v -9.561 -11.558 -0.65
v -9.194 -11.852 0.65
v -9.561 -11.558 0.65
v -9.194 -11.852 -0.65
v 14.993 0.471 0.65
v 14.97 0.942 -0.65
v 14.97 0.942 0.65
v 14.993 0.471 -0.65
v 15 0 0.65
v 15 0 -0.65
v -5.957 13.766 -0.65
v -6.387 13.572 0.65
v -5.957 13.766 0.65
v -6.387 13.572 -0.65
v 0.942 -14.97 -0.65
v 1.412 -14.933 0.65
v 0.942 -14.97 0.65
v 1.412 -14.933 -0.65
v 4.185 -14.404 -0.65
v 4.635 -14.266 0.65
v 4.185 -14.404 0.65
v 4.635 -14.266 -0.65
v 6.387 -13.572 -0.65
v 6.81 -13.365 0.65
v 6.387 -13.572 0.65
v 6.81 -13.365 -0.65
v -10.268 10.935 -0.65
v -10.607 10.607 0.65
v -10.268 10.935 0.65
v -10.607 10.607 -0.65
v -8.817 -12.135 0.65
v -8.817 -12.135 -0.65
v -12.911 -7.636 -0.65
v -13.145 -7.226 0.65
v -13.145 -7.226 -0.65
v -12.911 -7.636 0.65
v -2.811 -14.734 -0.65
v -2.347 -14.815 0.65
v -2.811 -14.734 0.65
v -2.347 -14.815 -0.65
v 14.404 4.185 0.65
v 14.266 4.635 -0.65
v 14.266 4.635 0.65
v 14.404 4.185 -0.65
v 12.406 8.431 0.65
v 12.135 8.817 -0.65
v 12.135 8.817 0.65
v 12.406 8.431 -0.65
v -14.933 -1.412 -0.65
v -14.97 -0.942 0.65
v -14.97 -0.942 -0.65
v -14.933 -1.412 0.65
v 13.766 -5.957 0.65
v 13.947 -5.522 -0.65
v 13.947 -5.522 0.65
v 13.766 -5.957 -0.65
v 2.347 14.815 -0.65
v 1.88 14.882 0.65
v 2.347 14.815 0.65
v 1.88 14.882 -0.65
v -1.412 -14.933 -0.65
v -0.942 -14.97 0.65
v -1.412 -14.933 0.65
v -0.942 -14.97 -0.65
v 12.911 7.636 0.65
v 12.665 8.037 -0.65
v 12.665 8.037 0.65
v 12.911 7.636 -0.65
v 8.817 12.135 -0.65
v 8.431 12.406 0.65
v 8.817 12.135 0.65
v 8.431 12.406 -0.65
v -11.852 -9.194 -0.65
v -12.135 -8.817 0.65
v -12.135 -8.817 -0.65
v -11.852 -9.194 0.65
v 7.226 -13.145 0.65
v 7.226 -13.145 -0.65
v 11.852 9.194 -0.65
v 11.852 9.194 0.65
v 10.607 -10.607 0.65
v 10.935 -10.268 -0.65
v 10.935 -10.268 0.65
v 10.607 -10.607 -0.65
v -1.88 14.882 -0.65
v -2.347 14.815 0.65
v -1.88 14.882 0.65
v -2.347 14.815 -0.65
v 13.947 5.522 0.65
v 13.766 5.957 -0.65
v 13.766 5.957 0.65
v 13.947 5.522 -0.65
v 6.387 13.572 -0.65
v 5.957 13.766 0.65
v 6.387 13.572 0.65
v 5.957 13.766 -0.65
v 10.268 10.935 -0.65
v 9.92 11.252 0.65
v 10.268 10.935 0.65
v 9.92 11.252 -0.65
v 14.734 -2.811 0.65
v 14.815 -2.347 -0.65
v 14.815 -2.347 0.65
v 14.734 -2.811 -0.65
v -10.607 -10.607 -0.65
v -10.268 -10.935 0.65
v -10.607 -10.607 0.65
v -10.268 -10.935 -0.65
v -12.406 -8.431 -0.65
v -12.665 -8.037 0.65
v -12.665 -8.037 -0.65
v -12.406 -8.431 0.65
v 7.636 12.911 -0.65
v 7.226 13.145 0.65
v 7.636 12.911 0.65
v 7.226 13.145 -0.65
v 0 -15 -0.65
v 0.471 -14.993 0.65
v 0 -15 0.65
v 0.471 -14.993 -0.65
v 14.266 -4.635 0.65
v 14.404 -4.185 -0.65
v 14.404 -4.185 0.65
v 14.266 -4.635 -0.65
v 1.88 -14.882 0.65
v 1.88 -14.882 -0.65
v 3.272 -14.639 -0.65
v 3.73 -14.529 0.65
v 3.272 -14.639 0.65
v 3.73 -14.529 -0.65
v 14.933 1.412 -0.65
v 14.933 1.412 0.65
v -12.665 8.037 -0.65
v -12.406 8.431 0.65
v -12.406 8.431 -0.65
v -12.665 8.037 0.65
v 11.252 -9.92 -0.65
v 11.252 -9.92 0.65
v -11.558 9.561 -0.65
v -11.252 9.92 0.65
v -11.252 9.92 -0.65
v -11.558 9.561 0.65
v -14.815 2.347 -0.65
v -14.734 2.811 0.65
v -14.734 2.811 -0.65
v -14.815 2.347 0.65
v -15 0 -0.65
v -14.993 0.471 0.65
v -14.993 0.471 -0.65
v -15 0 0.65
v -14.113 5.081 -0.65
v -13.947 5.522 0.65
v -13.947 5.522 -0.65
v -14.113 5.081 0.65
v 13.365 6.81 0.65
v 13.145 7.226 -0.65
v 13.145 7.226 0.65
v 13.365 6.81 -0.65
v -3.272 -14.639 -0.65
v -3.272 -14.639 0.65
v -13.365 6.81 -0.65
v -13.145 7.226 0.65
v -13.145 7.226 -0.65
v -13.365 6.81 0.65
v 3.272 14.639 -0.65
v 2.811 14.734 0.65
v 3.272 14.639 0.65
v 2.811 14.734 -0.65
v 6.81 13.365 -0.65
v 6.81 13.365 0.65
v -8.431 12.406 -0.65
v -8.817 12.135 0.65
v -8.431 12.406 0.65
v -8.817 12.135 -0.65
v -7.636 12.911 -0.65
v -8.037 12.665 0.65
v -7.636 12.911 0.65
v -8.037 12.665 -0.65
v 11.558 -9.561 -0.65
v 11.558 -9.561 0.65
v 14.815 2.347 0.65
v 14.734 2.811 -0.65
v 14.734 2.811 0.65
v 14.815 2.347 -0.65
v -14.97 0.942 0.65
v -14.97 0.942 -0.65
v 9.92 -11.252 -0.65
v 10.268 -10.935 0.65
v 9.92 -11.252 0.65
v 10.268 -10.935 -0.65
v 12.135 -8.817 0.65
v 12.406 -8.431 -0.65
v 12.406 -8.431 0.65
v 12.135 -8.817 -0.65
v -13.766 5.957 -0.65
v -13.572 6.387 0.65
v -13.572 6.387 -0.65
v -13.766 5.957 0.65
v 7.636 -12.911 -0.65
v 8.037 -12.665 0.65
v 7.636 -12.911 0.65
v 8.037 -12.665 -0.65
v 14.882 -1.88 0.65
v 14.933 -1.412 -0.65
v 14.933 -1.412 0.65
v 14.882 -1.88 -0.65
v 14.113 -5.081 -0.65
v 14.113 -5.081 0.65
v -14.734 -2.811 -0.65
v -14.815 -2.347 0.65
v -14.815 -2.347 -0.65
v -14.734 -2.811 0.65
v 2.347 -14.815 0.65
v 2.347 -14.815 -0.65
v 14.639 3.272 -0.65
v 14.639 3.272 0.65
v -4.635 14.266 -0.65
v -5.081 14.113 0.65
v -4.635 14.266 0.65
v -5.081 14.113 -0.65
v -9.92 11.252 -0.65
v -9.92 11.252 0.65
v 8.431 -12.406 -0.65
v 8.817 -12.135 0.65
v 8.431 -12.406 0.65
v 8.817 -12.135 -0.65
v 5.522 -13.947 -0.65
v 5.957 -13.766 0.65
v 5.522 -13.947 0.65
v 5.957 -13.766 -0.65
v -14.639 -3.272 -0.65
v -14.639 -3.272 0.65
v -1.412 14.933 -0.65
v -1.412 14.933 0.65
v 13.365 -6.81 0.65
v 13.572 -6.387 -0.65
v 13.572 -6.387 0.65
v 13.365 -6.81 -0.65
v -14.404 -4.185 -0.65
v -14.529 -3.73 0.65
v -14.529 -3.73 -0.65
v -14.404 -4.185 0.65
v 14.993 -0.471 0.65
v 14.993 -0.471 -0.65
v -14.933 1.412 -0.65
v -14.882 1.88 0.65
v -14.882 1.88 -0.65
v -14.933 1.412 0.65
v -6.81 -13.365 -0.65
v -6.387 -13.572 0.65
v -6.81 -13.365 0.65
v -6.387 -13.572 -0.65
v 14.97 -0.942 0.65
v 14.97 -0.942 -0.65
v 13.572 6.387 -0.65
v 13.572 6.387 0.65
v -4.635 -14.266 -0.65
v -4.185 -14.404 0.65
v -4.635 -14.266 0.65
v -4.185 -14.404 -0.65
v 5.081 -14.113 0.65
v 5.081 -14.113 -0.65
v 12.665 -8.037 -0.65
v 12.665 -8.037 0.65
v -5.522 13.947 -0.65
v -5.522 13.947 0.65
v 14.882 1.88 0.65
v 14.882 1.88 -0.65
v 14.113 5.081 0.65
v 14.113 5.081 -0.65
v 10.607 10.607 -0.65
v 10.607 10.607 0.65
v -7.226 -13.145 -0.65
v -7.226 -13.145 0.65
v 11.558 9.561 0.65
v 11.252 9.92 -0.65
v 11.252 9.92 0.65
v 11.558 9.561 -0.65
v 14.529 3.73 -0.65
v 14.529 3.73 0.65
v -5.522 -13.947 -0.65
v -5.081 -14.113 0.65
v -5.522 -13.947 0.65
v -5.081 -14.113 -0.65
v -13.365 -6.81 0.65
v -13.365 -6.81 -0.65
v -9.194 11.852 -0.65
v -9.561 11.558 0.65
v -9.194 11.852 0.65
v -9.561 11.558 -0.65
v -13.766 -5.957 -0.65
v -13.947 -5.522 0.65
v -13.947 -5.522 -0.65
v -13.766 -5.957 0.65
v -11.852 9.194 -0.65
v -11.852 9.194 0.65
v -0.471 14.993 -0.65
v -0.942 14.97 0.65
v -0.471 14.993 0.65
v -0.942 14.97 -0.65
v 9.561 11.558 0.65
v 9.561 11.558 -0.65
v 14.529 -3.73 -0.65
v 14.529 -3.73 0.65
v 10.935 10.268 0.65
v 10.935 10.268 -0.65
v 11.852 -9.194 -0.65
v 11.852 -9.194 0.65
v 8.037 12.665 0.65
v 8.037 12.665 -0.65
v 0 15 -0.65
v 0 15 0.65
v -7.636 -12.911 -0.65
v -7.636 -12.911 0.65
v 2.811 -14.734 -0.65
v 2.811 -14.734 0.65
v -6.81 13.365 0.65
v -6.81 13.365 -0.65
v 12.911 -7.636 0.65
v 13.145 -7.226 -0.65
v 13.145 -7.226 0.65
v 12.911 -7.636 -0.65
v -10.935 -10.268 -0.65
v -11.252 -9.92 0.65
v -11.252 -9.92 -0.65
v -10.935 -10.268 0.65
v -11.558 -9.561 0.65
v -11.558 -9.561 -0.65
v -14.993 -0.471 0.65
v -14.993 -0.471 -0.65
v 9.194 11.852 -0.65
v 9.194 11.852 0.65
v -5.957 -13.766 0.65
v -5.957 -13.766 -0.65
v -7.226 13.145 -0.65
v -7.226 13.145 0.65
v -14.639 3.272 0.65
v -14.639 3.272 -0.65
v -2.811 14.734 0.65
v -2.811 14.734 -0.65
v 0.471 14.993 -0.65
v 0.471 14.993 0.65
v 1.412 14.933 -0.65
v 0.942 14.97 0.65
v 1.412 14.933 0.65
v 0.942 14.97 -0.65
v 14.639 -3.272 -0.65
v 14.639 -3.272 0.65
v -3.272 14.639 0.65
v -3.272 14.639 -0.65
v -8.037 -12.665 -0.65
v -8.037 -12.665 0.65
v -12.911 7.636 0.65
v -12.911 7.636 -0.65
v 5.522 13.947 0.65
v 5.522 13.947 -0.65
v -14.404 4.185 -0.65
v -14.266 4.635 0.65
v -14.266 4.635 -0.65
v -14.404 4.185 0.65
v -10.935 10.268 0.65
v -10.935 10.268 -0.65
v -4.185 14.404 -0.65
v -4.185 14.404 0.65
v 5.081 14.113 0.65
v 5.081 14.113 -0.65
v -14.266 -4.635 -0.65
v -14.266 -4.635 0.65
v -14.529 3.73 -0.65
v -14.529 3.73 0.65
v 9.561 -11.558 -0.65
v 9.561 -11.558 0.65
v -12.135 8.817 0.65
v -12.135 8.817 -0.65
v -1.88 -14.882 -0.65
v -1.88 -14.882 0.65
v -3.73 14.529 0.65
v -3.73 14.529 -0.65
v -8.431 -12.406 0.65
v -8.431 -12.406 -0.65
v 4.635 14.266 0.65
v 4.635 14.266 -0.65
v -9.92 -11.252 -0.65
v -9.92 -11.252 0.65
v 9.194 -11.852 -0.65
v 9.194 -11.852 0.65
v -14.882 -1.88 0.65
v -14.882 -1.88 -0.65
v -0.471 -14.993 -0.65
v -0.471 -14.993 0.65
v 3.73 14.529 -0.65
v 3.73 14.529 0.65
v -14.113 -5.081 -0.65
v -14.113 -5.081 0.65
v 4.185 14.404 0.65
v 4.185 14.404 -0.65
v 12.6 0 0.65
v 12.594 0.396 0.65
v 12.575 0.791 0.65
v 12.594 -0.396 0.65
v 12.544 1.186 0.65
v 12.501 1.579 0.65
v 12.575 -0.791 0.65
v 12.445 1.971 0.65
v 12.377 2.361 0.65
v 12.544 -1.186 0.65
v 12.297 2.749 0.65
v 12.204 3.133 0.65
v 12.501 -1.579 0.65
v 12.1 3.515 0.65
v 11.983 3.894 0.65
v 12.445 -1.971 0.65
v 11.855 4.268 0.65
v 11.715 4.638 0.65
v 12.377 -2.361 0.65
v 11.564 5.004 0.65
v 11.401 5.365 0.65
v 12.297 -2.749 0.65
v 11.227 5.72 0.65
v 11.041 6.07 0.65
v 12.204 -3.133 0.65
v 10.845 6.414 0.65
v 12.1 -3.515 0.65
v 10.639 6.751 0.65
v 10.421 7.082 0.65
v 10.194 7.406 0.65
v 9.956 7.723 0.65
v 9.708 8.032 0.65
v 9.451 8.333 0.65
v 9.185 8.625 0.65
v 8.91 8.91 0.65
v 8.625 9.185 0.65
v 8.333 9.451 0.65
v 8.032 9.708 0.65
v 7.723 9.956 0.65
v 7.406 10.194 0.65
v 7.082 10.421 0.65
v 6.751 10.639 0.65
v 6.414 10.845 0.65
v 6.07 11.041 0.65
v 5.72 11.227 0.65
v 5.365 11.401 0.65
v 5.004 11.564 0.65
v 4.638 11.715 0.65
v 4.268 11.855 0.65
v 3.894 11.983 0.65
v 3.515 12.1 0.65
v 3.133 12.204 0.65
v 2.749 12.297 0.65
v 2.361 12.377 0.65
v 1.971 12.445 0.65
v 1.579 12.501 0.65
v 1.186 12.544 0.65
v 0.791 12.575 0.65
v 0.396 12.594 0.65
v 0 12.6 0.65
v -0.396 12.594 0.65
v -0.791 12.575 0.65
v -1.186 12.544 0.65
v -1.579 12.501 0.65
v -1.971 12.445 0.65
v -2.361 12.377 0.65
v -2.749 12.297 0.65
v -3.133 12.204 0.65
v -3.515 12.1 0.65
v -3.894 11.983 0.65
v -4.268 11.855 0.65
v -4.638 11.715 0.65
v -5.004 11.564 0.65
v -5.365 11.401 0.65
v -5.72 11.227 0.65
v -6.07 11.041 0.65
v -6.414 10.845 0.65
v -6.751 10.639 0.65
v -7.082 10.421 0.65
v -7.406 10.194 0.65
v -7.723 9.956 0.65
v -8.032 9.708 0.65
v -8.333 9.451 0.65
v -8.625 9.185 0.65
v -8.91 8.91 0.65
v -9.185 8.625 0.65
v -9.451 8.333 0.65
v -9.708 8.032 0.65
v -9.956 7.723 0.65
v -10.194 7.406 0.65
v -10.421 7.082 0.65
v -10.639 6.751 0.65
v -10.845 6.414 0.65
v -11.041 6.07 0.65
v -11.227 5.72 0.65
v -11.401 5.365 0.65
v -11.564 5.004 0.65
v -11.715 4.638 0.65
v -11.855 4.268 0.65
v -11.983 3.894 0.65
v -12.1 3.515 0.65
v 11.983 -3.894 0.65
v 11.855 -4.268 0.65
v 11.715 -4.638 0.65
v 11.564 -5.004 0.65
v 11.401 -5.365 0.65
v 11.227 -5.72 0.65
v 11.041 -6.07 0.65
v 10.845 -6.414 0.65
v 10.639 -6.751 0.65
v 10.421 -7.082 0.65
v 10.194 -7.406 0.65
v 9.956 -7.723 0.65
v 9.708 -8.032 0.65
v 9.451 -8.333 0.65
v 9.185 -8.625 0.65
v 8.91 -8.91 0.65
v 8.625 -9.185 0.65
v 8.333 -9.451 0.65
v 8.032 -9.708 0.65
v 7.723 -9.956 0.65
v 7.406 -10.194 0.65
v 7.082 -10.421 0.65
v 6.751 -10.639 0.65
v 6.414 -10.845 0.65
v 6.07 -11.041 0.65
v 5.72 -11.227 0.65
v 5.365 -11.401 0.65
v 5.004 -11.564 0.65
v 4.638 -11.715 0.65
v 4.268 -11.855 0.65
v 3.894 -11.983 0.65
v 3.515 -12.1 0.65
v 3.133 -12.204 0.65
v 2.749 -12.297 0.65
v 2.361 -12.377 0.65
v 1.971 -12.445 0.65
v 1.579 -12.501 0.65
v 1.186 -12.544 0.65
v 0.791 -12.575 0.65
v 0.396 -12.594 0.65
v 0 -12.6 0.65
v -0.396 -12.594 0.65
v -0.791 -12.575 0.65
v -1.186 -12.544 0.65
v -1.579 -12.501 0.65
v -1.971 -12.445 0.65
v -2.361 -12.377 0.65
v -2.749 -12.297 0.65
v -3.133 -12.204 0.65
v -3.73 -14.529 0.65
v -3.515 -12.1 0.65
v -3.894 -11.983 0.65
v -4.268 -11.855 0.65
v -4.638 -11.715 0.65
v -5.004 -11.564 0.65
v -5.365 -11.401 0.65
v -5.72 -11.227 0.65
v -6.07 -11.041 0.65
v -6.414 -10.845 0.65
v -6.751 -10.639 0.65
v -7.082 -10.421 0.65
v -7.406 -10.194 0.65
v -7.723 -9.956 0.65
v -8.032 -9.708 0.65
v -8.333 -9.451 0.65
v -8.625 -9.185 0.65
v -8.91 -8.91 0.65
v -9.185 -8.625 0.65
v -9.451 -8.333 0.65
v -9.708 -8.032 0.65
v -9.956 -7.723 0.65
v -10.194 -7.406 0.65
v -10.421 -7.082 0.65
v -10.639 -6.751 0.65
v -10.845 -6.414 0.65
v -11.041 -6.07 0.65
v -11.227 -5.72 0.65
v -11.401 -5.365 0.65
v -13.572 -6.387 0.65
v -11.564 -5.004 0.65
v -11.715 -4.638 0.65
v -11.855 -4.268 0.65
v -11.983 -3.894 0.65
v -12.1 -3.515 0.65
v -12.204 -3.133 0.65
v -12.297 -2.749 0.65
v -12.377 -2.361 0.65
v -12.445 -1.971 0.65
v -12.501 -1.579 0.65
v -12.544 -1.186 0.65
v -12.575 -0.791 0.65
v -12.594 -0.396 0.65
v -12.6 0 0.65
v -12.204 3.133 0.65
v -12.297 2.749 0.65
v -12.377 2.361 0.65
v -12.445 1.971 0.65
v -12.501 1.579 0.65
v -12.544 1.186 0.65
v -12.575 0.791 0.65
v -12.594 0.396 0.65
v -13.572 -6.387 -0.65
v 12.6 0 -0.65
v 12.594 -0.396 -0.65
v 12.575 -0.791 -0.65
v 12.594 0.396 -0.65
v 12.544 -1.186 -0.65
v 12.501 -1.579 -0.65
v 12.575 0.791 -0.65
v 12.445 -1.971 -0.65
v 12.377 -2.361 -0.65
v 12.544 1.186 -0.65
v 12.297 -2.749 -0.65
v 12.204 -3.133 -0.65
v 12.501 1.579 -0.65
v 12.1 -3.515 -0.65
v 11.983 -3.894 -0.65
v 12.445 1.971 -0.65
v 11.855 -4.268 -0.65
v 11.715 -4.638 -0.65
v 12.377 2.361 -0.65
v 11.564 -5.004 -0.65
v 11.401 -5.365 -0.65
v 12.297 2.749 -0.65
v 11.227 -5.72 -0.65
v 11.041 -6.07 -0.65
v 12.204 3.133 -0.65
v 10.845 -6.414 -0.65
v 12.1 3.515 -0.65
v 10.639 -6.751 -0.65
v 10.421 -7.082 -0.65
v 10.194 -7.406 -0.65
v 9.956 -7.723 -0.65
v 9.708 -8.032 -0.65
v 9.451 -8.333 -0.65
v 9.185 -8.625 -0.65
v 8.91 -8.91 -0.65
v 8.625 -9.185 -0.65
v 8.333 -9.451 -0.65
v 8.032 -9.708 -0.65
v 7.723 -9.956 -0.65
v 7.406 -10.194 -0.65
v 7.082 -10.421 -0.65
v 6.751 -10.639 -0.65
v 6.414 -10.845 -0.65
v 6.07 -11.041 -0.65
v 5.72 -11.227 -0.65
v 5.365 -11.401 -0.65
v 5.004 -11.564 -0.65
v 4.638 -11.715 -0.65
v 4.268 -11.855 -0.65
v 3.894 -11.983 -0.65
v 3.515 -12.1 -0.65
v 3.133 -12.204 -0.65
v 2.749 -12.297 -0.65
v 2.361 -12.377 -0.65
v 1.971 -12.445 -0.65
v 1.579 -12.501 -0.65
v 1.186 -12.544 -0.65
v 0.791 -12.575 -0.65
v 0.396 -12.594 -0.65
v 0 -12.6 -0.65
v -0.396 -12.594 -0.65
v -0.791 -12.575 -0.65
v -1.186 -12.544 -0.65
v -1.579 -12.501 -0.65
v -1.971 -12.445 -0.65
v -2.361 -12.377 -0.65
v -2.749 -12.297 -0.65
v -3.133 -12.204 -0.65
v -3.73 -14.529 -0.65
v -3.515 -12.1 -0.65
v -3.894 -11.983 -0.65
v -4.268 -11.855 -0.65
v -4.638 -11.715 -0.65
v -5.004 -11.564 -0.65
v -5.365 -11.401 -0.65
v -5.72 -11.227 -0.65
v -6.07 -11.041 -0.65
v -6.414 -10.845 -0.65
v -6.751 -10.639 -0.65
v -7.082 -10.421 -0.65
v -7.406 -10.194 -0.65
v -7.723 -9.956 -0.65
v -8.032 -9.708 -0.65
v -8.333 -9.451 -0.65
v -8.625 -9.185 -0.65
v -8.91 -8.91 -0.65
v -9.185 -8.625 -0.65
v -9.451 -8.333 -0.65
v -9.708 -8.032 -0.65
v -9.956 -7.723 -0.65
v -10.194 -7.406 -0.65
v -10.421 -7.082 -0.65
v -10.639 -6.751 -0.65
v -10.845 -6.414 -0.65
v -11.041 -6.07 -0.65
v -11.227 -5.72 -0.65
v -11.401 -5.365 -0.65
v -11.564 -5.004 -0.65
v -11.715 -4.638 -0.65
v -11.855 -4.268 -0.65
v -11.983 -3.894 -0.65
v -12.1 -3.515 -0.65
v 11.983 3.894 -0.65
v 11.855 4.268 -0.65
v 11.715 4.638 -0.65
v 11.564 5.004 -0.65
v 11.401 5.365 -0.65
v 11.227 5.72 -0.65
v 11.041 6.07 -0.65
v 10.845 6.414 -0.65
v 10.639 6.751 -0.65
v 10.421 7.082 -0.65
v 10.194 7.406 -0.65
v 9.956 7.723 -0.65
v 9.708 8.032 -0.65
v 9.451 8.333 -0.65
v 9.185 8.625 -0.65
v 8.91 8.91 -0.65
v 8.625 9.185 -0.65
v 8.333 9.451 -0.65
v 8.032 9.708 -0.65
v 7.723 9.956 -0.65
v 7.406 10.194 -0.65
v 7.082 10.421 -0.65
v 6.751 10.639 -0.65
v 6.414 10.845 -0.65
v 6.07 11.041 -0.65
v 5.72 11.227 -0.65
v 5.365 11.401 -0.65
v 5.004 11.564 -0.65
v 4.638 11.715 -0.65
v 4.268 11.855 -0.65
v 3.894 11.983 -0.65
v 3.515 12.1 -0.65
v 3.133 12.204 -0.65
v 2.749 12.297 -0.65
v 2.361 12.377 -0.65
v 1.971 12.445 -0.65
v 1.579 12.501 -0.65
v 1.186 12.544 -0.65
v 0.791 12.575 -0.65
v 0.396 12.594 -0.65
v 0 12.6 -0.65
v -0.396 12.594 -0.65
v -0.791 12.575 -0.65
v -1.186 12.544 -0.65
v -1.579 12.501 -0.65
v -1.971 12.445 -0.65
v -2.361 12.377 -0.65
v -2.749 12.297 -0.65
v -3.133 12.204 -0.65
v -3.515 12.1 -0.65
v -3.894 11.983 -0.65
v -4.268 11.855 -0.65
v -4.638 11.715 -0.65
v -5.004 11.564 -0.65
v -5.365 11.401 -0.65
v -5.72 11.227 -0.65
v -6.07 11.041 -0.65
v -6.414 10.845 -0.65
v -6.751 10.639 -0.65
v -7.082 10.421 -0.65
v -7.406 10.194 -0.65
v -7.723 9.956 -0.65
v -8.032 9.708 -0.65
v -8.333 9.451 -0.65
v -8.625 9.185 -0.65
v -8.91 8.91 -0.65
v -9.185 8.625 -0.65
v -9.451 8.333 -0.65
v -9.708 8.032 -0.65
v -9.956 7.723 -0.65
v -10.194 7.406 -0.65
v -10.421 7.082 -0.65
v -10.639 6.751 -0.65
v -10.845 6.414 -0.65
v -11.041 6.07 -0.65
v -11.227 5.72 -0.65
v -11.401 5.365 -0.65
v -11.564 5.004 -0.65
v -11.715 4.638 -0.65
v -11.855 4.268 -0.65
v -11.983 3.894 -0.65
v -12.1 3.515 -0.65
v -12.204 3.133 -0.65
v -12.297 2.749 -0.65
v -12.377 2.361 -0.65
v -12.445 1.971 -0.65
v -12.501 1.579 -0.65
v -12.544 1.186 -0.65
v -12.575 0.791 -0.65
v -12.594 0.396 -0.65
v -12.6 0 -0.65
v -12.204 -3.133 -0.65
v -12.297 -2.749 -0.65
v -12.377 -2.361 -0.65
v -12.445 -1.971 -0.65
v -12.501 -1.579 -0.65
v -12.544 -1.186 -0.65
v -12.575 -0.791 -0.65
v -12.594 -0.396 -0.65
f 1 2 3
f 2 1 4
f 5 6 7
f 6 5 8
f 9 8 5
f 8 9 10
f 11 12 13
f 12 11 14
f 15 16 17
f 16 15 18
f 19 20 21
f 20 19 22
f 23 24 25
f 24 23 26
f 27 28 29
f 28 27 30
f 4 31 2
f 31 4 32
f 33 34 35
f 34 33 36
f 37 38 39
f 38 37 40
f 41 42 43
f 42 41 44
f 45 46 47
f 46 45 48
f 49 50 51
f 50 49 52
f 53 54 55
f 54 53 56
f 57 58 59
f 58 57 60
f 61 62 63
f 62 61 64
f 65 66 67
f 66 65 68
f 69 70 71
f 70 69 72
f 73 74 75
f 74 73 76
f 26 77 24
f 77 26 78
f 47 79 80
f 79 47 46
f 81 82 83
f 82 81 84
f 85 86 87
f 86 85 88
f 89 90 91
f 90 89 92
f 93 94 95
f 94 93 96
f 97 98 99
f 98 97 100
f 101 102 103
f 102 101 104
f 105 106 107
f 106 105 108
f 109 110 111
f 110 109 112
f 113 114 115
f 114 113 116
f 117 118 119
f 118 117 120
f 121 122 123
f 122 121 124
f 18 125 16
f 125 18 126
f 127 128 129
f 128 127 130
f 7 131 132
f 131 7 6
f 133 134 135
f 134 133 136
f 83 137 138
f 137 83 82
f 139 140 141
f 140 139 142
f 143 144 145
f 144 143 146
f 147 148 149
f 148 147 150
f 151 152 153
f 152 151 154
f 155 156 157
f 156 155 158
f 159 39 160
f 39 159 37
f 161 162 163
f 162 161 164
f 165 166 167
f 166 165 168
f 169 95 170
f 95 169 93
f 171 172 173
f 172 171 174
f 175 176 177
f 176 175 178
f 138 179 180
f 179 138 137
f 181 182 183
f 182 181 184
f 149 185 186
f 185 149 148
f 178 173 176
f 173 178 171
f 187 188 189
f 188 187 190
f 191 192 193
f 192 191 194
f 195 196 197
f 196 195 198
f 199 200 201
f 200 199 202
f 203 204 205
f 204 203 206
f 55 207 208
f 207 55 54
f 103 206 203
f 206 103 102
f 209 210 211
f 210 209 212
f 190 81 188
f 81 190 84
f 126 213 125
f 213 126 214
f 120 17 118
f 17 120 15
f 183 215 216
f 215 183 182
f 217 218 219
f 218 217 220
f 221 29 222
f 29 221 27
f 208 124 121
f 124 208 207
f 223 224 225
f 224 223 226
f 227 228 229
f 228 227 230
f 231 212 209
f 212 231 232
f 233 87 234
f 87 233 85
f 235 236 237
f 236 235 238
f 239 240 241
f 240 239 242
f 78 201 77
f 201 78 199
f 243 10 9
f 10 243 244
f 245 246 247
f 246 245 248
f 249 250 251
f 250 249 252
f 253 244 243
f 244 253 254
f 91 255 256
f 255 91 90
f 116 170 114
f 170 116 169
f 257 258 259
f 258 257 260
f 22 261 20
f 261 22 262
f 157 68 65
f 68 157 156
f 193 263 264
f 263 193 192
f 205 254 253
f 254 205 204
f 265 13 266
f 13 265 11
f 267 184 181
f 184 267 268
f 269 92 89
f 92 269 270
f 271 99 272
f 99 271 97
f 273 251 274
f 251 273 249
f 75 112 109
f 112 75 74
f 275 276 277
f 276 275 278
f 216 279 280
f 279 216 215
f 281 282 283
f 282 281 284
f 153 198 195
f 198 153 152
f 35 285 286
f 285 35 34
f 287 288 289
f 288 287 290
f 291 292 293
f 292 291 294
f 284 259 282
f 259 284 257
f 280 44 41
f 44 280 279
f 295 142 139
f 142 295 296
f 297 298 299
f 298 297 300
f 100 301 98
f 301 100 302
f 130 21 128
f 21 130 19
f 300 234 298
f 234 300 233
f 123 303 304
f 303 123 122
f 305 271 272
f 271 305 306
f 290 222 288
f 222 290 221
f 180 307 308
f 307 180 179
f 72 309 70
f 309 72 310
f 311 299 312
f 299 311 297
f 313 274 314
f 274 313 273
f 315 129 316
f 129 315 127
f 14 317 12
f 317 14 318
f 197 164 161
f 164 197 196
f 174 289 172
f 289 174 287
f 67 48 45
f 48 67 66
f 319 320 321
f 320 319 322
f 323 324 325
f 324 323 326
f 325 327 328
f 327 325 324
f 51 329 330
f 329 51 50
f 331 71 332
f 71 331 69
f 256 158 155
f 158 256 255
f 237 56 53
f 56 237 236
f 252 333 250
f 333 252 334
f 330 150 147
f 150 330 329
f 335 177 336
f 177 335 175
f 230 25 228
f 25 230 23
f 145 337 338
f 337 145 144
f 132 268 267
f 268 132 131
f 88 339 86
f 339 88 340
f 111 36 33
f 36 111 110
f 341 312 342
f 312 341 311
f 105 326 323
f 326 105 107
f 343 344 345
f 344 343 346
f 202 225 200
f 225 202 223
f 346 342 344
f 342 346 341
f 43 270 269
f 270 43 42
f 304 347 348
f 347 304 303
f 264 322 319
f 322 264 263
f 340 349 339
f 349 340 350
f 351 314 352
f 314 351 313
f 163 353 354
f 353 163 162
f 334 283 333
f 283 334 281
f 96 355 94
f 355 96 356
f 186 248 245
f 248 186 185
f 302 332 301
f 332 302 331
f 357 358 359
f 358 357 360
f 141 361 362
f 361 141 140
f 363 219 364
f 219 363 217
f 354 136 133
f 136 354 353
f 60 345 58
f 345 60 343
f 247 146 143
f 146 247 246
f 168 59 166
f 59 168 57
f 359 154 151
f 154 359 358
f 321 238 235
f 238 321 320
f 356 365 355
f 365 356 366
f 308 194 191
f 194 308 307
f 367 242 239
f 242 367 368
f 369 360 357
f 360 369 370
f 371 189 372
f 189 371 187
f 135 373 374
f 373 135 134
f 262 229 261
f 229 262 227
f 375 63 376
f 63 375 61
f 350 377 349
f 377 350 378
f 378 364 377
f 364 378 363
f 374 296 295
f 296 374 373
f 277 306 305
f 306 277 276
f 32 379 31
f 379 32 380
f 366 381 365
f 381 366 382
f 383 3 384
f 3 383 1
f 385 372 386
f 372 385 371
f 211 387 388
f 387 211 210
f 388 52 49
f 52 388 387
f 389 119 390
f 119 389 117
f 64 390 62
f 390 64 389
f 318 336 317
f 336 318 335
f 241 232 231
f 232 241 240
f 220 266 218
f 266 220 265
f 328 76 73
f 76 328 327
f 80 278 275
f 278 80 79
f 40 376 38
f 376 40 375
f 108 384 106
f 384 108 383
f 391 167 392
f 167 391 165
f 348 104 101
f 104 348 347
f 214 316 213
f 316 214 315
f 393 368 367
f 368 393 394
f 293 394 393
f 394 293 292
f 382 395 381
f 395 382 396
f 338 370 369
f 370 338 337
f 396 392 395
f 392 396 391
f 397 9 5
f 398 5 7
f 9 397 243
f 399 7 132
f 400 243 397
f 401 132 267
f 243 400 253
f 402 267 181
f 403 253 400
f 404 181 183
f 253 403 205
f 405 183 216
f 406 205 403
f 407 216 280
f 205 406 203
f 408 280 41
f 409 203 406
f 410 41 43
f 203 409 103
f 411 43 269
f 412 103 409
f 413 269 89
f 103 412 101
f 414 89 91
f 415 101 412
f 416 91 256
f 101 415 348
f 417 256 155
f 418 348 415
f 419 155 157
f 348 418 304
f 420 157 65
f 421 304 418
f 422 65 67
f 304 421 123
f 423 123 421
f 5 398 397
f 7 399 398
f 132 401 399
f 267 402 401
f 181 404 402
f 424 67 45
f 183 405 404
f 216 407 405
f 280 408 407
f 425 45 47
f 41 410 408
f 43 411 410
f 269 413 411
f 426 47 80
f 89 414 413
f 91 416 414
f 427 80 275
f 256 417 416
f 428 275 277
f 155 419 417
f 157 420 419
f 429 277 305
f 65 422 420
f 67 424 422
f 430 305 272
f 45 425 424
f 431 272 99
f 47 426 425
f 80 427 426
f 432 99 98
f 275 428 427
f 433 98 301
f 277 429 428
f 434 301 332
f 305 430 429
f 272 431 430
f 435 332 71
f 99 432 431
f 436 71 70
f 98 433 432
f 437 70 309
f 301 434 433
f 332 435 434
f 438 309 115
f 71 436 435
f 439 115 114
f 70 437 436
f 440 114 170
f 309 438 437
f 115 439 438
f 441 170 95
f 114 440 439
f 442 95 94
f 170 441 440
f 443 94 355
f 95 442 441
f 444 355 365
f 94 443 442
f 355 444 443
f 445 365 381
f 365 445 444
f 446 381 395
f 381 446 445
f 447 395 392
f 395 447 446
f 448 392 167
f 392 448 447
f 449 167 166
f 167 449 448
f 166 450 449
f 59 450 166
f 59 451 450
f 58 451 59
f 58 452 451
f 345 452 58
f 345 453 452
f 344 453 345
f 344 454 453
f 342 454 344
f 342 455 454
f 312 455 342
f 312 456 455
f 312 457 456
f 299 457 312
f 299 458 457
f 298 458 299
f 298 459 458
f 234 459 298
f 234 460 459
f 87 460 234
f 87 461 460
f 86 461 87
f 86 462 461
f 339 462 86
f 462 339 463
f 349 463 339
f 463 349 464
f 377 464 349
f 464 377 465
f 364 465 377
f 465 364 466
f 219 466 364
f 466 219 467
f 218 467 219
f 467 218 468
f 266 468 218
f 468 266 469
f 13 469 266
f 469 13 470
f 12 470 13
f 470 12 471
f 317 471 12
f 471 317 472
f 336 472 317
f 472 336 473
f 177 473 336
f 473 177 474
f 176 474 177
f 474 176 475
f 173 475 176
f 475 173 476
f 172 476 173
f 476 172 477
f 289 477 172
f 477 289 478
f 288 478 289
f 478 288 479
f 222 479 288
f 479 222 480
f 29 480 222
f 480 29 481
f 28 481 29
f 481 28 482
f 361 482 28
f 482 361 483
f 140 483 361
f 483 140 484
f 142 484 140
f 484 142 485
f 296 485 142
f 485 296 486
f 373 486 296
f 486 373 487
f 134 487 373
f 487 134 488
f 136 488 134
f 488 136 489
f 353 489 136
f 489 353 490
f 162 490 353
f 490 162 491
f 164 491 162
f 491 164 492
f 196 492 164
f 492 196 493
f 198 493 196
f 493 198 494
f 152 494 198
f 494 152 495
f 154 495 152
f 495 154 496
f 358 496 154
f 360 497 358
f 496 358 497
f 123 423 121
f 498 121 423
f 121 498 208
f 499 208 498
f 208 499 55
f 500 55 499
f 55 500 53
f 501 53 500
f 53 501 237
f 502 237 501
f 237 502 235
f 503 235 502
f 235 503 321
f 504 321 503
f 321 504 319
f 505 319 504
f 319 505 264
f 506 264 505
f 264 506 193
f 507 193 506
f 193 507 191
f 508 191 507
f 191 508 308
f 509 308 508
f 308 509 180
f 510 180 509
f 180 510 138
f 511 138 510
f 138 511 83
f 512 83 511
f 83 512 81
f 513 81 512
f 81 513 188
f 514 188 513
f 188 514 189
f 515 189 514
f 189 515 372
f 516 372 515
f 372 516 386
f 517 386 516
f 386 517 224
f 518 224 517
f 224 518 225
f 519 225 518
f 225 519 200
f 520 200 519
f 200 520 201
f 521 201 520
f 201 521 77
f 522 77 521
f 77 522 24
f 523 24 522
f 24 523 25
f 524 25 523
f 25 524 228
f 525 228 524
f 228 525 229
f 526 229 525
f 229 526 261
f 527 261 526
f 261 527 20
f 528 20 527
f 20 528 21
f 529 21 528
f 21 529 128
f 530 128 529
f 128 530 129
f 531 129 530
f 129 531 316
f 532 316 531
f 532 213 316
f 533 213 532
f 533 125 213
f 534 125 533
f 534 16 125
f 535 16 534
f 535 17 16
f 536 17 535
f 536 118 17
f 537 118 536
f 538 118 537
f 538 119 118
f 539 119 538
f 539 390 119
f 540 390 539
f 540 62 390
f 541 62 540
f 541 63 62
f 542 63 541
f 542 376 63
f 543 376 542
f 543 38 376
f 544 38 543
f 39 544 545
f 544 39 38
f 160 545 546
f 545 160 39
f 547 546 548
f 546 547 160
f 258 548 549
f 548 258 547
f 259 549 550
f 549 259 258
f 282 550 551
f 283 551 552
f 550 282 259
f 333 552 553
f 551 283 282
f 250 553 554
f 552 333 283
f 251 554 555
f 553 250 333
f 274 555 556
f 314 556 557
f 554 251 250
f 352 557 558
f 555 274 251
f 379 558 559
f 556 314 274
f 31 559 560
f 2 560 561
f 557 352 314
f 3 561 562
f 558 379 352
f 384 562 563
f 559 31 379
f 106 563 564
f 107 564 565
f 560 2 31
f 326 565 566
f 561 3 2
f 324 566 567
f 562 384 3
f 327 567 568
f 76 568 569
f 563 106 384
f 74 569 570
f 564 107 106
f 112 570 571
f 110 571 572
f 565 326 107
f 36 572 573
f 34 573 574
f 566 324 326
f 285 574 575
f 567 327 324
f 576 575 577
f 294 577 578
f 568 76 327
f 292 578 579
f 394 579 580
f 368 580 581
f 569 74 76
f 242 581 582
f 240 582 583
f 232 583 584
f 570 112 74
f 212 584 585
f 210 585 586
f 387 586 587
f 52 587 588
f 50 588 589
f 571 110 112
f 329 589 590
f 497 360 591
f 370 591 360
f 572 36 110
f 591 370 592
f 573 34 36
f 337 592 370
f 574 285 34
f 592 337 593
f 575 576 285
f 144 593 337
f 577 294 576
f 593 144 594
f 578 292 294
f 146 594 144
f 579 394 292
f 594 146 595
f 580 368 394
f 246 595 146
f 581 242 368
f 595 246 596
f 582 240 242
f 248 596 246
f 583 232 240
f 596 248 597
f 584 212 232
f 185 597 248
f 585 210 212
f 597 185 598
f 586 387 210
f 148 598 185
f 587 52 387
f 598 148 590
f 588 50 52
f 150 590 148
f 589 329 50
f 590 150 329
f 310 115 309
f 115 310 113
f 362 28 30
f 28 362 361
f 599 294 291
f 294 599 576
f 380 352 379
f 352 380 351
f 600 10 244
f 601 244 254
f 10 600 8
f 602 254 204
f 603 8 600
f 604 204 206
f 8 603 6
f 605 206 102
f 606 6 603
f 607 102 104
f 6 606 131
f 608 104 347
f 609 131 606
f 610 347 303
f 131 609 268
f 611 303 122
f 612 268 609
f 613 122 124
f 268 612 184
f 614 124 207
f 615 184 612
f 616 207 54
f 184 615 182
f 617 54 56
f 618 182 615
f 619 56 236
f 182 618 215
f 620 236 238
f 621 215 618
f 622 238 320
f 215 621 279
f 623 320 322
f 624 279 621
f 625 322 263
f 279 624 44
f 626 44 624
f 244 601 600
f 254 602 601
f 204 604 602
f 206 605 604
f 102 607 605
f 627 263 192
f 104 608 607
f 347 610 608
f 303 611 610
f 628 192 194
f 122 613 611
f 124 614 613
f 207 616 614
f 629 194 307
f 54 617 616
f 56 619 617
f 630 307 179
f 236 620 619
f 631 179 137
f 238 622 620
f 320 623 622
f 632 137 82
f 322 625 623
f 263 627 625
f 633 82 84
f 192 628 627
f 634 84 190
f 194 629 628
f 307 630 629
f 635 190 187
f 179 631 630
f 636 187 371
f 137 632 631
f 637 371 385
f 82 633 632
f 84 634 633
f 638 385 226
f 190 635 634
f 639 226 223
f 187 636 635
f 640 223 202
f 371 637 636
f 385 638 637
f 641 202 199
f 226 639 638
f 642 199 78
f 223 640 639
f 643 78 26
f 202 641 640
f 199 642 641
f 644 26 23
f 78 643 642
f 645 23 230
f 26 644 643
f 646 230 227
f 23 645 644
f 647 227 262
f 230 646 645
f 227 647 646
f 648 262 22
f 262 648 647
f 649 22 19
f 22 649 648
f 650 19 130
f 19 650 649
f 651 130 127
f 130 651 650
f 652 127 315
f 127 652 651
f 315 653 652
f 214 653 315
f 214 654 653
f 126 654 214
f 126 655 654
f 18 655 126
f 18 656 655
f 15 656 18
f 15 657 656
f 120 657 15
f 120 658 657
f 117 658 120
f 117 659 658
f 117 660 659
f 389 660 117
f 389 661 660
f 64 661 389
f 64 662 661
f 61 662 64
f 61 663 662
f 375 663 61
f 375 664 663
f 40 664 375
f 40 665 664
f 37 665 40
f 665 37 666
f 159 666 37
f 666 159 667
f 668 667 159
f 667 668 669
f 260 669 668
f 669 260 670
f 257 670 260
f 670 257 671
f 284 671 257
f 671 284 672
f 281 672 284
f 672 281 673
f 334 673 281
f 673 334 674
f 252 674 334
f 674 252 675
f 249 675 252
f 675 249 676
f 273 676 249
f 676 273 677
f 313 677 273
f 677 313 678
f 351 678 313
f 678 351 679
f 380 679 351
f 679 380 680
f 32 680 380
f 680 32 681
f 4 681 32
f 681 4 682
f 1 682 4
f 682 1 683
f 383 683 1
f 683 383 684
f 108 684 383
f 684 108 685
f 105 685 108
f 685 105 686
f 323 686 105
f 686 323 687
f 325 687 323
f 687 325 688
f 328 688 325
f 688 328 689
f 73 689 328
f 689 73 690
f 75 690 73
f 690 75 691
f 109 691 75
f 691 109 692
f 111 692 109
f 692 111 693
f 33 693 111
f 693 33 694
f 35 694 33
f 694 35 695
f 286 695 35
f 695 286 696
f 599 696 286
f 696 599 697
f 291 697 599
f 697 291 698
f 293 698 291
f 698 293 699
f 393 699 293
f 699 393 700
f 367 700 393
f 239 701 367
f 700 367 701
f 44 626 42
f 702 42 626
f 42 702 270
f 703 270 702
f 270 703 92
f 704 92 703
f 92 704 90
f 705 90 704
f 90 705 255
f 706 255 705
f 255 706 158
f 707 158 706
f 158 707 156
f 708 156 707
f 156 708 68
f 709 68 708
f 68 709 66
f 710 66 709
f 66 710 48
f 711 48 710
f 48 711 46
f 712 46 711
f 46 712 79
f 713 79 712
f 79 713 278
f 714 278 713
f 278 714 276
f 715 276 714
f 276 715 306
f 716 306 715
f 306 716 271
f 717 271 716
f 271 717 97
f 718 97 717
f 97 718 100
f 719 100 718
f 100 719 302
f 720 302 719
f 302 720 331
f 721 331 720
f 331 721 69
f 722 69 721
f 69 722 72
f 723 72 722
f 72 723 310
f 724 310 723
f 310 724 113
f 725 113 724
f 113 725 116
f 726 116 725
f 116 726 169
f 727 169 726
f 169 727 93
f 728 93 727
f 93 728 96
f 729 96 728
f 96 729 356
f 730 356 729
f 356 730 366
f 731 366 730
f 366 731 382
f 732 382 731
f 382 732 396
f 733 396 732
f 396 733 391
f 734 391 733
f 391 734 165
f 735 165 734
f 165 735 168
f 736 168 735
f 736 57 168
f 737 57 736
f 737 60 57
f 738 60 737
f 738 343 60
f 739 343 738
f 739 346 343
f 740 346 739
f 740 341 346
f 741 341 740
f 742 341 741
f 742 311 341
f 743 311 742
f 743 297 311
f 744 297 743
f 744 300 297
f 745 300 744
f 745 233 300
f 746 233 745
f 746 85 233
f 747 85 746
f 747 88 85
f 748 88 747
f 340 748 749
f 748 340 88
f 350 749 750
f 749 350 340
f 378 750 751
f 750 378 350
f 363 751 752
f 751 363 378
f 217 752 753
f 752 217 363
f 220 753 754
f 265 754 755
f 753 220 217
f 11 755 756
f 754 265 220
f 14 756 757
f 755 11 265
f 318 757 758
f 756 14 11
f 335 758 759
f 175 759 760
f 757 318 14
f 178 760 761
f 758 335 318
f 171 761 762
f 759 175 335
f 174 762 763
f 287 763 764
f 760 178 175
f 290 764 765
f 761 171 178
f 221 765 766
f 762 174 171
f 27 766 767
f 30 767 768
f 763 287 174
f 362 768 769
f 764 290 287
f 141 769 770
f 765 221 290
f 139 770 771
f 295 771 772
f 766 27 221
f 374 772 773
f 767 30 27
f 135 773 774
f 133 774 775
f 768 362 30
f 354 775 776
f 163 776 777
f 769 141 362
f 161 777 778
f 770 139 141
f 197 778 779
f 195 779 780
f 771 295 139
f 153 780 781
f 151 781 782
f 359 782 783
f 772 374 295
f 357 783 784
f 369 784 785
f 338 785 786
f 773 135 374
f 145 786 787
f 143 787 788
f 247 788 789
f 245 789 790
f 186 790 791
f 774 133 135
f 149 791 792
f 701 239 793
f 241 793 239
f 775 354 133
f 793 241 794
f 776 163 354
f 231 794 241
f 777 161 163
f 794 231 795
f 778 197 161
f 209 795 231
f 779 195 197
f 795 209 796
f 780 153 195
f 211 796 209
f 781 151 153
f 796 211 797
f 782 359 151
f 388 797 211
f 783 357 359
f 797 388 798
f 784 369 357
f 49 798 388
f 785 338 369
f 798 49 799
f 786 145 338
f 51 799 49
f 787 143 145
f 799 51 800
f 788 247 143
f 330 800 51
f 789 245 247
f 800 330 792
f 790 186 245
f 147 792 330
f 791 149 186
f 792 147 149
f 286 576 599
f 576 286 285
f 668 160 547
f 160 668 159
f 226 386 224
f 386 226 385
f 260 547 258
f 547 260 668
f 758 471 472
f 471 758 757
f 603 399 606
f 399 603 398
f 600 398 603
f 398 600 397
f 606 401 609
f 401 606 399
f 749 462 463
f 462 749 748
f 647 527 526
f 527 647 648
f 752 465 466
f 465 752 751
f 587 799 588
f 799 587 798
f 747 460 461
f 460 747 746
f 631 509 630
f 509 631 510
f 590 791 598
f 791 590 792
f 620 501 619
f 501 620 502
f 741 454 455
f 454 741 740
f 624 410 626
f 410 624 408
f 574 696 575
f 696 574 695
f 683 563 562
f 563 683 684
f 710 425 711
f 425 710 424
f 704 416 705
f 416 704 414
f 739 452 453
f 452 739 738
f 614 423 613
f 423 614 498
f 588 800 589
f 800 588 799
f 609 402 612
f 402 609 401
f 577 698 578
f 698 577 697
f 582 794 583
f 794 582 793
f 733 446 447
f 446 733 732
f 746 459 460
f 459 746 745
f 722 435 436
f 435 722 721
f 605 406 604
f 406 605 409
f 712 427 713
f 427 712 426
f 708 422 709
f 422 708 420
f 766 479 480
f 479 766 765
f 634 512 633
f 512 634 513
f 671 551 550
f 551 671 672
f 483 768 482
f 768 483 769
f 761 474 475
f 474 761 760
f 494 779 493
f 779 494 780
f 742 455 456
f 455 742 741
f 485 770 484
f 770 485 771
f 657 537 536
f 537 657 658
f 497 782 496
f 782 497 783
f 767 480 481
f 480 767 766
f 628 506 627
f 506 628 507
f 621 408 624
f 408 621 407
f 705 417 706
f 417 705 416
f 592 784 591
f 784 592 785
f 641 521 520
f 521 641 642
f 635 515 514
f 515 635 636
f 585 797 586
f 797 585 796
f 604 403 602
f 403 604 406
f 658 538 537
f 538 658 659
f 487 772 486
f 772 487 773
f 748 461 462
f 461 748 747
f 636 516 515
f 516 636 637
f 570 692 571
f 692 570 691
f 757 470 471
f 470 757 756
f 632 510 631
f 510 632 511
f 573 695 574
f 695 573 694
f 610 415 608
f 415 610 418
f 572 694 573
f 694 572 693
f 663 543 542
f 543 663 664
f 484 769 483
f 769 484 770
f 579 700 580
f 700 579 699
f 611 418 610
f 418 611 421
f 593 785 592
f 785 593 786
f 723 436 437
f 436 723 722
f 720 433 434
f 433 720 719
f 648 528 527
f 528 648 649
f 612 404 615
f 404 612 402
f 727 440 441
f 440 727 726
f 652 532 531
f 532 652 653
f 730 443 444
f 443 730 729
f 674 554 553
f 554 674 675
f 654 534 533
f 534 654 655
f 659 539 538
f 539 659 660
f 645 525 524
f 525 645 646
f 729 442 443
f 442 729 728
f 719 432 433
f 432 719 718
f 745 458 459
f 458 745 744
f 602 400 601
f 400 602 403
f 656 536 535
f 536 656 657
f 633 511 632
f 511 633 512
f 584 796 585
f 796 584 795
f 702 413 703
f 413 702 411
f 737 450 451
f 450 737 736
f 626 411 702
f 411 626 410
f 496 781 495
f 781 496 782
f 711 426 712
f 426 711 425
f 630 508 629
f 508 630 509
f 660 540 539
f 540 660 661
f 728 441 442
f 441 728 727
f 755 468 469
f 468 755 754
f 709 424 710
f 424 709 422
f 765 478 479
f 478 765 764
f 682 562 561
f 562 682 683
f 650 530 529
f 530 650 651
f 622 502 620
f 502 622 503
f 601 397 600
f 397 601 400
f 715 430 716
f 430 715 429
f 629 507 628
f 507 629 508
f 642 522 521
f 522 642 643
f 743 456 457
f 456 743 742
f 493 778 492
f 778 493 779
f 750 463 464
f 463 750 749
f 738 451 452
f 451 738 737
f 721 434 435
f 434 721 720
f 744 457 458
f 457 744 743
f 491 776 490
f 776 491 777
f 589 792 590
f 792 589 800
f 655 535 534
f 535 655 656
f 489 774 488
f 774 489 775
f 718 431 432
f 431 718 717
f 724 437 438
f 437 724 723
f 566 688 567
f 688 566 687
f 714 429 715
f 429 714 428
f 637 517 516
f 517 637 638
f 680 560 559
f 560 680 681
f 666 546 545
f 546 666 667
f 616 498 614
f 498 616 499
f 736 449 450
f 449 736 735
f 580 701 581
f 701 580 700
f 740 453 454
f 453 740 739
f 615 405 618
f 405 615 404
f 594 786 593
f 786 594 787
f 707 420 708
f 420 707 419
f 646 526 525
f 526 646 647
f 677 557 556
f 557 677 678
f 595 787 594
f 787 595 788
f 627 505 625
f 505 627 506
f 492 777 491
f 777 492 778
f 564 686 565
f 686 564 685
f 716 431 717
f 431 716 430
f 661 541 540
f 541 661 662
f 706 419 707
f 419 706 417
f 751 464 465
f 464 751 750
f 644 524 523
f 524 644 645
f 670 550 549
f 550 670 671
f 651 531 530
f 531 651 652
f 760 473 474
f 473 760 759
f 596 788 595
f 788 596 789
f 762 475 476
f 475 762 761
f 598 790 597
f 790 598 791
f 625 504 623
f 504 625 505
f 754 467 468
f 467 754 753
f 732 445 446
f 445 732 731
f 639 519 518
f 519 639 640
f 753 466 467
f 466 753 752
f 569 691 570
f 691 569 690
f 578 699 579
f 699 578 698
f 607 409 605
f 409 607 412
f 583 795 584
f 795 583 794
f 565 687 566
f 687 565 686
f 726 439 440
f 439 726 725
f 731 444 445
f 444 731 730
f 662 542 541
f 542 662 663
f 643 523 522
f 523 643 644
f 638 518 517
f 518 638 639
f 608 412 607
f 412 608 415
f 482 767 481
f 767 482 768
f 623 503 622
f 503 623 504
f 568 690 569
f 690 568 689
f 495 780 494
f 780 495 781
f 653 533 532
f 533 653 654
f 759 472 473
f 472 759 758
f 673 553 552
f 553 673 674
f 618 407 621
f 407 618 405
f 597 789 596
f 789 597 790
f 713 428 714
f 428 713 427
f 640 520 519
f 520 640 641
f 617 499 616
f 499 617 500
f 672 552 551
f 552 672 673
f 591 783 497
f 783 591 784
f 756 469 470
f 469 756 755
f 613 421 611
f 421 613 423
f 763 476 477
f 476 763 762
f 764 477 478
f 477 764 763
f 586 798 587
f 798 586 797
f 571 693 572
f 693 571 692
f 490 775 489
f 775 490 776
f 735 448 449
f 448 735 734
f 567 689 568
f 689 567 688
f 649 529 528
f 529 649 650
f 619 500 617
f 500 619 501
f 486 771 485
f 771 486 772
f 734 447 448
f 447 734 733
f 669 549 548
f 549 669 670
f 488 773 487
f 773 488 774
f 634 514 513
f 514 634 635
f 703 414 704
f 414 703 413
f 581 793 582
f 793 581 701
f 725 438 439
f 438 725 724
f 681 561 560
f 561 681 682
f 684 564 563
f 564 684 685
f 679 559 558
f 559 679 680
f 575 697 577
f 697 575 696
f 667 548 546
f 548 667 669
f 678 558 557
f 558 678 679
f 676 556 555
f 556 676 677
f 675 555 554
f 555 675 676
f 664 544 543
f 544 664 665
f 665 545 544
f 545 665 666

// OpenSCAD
// general object resolution
$fn = 200;

dia_in = 25.2;
dia_out = 30.0;
thickness = 1.3;

difference() {
	cylinder(r=dia_out/2, h=thickness, center=true);
	cylinder(r=dia_in/2, h=10, center=true);
}
